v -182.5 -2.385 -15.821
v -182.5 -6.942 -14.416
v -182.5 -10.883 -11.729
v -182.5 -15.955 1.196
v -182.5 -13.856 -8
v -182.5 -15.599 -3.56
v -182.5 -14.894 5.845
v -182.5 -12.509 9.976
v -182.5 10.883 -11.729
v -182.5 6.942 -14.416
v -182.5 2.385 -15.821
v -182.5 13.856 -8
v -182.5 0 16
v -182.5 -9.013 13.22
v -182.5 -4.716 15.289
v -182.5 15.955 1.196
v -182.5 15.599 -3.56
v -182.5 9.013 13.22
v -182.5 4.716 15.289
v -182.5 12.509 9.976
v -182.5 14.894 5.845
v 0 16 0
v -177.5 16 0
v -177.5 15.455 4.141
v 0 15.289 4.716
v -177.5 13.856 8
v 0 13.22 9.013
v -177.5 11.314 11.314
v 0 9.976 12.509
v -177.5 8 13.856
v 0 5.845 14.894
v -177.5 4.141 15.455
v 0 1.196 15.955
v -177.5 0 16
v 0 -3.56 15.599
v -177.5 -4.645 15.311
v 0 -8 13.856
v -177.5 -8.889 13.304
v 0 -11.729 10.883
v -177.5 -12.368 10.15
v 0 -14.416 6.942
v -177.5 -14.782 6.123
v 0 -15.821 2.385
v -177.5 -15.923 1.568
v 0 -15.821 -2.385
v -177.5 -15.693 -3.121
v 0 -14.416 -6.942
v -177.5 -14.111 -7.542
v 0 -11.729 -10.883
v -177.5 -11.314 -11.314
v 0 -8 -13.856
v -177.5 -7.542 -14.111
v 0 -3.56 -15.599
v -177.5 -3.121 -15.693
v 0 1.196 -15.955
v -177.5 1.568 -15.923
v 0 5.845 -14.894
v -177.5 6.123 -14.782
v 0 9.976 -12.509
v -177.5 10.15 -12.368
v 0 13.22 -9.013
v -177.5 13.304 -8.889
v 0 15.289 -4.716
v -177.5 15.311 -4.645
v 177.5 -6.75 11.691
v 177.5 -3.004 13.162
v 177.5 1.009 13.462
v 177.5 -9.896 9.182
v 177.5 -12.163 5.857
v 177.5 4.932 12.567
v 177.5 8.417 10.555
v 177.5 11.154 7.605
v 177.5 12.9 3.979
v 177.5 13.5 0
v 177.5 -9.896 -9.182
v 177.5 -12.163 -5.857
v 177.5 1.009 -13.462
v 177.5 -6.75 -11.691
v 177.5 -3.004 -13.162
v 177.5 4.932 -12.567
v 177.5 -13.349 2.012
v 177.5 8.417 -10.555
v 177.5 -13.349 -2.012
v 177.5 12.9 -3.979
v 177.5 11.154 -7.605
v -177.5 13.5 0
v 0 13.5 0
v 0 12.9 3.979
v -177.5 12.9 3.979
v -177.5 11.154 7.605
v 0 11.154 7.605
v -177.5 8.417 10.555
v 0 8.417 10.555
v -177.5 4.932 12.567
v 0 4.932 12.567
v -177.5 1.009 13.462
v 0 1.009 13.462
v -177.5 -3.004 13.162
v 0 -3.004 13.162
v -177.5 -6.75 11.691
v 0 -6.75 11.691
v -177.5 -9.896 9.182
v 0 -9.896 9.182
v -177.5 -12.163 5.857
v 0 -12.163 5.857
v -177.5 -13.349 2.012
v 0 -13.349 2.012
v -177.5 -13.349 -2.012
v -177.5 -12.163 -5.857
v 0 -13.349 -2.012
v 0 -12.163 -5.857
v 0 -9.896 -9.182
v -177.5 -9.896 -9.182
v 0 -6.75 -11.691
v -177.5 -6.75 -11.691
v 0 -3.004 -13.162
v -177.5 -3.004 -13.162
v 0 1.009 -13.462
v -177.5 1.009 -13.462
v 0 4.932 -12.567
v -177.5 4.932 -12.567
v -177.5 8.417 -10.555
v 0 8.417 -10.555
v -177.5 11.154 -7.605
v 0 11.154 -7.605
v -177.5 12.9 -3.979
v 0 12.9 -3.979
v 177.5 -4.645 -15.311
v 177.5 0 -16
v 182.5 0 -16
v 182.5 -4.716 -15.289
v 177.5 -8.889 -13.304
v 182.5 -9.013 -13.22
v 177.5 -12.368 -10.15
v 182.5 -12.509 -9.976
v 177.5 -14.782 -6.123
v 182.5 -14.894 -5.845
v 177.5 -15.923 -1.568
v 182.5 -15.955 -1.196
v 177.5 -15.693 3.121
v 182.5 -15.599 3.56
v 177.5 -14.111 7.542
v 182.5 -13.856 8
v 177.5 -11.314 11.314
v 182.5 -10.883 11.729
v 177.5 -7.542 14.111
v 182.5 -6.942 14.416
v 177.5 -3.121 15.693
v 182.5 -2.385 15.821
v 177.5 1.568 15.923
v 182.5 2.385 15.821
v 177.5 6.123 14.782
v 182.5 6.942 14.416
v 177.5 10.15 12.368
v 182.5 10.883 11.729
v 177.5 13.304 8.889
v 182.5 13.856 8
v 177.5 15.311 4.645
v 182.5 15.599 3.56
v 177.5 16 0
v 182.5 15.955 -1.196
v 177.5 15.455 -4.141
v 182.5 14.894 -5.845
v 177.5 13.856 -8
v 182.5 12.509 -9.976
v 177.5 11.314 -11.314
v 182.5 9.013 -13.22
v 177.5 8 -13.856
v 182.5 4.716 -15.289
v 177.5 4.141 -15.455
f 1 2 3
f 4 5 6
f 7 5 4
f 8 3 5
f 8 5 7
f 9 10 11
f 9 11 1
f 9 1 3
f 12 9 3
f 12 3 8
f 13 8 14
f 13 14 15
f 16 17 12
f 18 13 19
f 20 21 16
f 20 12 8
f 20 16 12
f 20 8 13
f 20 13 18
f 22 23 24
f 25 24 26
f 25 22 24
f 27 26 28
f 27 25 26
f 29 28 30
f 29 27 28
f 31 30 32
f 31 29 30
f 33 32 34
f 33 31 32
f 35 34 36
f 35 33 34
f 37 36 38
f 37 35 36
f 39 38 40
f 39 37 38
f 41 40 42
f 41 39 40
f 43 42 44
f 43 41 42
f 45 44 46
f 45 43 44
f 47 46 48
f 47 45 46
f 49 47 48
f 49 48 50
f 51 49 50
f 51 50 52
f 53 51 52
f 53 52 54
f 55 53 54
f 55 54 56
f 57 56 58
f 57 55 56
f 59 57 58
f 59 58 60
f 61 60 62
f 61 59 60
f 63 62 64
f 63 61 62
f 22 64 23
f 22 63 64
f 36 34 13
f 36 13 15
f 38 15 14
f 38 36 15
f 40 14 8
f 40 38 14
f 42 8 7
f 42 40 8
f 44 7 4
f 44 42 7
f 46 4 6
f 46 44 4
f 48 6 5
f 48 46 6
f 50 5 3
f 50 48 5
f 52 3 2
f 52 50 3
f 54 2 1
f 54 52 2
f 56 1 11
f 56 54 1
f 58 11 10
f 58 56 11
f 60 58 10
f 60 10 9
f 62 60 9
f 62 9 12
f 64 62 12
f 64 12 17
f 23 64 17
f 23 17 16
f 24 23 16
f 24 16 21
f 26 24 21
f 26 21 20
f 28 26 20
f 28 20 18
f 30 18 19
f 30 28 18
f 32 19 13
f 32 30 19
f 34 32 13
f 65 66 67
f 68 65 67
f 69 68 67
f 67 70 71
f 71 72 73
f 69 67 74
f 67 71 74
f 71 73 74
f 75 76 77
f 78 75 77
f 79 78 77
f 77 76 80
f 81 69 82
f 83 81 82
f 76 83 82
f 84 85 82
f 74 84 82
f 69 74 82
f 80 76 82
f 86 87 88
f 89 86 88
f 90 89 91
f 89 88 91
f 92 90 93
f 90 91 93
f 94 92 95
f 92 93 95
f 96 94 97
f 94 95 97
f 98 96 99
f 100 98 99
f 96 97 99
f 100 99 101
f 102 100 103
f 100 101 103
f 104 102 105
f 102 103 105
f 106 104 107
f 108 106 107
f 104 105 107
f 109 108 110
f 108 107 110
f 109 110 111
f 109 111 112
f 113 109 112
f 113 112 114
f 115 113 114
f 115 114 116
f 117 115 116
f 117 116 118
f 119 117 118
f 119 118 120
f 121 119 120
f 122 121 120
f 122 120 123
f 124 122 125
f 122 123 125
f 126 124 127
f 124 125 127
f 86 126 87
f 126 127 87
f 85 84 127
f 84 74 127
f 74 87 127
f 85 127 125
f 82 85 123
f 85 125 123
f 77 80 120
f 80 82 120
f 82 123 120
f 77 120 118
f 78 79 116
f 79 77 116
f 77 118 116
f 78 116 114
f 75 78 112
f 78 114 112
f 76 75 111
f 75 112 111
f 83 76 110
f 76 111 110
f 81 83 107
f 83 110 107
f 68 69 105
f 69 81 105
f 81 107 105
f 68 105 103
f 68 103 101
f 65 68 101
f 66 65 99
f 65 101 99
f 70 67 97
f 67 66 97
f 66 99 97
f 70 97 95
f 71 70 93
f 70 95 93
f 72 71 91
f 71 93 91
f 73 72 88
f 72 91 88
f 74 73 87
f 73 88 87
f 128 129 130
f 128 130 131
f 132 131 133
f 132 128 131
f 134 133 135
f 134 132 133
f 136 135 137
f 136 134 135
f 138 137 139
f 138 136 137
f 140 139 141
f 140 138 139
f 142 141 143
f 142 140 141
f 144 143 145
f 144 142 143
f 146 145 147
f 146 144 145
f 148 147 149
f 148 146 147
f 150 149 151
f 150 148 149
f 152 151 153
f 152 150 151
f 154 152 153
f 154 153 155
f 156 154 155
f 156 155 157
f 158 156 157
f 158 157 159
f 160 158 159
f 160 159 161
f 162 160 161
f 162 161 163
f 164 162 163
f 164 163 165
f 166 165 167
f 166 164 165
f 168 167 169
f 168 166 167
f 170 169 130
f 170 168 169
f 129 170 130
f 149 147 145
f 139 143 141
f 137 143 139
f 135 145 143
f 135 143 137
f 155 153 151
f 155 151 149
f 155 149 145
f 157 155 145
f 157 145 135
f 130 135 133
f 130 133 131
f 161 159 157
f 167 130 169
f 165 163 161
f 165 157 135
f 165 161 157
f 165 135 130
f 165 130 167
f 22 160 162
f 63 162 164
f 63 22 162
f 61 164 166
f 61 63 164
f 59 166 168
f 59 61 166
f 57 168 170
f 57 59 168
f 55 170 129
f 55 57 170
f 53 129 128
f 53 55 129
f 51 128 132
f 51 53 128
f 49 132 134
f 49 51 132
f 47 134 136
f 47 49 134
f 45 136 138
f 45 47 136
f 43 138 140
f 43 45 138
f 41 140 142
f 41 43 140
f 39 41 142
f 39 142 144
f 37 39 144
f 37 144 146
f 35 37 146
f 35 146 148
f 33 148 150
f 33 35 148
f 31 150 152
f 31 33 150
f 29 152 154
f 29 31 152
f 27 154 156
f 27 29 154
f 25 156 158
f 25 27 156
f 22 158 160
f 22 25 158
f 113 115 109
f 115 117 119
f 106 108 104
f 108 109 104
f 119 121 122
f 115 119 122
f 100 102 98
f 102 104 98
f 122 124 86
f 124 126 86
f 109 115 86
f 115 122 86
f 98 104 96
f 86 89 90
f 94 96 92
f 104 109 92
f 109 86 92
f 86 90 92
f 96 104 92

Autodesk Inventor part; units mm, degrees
ref_plane "YZ Plane" through (0, 0, 0) normal (1, 0, 0) x (0, 1, 0)
ref_plane "XZ Plane" through (0, 0, 0) normal (0, 1, 0) x (-1, 0, 0)
ref_plane "XY Plane" through (0, 0, 0) normal (0, 0, 1) x (1, 0, 0)
sketch "Sketch1" plane through (0, 0, 0) normal (1, 0, 0) x (0, 1, 0)
  circle A0 centre (0, 0) radius 16
  circle A1 centre (0, 0) radius 13.5
  dimension "d0" = 32
  dimension "d1" = 27
extrude "Extrusion1" add sketch "Sketch1" along normal mid plane 355
sketch "Sketch2" plane through (177.5, 0, 0) normal (1, 0, 0) x (0, 0, -1)
  circle A0 centre (0, 0) radius 16
  dimension "d4" = 32
extrude "Extrusion2" add sketch "Sketch2" along normal blind 5
sketch "Sketch3" plane through (-177.5, 0, 0) normal (-1, 0, 0) x (0, 0, 1)
  circle A0 centre (0, 0) radius 16
extrude "Extrusion3" add sketch "Sketch3" along normal blind 5
properties material "Glass"
